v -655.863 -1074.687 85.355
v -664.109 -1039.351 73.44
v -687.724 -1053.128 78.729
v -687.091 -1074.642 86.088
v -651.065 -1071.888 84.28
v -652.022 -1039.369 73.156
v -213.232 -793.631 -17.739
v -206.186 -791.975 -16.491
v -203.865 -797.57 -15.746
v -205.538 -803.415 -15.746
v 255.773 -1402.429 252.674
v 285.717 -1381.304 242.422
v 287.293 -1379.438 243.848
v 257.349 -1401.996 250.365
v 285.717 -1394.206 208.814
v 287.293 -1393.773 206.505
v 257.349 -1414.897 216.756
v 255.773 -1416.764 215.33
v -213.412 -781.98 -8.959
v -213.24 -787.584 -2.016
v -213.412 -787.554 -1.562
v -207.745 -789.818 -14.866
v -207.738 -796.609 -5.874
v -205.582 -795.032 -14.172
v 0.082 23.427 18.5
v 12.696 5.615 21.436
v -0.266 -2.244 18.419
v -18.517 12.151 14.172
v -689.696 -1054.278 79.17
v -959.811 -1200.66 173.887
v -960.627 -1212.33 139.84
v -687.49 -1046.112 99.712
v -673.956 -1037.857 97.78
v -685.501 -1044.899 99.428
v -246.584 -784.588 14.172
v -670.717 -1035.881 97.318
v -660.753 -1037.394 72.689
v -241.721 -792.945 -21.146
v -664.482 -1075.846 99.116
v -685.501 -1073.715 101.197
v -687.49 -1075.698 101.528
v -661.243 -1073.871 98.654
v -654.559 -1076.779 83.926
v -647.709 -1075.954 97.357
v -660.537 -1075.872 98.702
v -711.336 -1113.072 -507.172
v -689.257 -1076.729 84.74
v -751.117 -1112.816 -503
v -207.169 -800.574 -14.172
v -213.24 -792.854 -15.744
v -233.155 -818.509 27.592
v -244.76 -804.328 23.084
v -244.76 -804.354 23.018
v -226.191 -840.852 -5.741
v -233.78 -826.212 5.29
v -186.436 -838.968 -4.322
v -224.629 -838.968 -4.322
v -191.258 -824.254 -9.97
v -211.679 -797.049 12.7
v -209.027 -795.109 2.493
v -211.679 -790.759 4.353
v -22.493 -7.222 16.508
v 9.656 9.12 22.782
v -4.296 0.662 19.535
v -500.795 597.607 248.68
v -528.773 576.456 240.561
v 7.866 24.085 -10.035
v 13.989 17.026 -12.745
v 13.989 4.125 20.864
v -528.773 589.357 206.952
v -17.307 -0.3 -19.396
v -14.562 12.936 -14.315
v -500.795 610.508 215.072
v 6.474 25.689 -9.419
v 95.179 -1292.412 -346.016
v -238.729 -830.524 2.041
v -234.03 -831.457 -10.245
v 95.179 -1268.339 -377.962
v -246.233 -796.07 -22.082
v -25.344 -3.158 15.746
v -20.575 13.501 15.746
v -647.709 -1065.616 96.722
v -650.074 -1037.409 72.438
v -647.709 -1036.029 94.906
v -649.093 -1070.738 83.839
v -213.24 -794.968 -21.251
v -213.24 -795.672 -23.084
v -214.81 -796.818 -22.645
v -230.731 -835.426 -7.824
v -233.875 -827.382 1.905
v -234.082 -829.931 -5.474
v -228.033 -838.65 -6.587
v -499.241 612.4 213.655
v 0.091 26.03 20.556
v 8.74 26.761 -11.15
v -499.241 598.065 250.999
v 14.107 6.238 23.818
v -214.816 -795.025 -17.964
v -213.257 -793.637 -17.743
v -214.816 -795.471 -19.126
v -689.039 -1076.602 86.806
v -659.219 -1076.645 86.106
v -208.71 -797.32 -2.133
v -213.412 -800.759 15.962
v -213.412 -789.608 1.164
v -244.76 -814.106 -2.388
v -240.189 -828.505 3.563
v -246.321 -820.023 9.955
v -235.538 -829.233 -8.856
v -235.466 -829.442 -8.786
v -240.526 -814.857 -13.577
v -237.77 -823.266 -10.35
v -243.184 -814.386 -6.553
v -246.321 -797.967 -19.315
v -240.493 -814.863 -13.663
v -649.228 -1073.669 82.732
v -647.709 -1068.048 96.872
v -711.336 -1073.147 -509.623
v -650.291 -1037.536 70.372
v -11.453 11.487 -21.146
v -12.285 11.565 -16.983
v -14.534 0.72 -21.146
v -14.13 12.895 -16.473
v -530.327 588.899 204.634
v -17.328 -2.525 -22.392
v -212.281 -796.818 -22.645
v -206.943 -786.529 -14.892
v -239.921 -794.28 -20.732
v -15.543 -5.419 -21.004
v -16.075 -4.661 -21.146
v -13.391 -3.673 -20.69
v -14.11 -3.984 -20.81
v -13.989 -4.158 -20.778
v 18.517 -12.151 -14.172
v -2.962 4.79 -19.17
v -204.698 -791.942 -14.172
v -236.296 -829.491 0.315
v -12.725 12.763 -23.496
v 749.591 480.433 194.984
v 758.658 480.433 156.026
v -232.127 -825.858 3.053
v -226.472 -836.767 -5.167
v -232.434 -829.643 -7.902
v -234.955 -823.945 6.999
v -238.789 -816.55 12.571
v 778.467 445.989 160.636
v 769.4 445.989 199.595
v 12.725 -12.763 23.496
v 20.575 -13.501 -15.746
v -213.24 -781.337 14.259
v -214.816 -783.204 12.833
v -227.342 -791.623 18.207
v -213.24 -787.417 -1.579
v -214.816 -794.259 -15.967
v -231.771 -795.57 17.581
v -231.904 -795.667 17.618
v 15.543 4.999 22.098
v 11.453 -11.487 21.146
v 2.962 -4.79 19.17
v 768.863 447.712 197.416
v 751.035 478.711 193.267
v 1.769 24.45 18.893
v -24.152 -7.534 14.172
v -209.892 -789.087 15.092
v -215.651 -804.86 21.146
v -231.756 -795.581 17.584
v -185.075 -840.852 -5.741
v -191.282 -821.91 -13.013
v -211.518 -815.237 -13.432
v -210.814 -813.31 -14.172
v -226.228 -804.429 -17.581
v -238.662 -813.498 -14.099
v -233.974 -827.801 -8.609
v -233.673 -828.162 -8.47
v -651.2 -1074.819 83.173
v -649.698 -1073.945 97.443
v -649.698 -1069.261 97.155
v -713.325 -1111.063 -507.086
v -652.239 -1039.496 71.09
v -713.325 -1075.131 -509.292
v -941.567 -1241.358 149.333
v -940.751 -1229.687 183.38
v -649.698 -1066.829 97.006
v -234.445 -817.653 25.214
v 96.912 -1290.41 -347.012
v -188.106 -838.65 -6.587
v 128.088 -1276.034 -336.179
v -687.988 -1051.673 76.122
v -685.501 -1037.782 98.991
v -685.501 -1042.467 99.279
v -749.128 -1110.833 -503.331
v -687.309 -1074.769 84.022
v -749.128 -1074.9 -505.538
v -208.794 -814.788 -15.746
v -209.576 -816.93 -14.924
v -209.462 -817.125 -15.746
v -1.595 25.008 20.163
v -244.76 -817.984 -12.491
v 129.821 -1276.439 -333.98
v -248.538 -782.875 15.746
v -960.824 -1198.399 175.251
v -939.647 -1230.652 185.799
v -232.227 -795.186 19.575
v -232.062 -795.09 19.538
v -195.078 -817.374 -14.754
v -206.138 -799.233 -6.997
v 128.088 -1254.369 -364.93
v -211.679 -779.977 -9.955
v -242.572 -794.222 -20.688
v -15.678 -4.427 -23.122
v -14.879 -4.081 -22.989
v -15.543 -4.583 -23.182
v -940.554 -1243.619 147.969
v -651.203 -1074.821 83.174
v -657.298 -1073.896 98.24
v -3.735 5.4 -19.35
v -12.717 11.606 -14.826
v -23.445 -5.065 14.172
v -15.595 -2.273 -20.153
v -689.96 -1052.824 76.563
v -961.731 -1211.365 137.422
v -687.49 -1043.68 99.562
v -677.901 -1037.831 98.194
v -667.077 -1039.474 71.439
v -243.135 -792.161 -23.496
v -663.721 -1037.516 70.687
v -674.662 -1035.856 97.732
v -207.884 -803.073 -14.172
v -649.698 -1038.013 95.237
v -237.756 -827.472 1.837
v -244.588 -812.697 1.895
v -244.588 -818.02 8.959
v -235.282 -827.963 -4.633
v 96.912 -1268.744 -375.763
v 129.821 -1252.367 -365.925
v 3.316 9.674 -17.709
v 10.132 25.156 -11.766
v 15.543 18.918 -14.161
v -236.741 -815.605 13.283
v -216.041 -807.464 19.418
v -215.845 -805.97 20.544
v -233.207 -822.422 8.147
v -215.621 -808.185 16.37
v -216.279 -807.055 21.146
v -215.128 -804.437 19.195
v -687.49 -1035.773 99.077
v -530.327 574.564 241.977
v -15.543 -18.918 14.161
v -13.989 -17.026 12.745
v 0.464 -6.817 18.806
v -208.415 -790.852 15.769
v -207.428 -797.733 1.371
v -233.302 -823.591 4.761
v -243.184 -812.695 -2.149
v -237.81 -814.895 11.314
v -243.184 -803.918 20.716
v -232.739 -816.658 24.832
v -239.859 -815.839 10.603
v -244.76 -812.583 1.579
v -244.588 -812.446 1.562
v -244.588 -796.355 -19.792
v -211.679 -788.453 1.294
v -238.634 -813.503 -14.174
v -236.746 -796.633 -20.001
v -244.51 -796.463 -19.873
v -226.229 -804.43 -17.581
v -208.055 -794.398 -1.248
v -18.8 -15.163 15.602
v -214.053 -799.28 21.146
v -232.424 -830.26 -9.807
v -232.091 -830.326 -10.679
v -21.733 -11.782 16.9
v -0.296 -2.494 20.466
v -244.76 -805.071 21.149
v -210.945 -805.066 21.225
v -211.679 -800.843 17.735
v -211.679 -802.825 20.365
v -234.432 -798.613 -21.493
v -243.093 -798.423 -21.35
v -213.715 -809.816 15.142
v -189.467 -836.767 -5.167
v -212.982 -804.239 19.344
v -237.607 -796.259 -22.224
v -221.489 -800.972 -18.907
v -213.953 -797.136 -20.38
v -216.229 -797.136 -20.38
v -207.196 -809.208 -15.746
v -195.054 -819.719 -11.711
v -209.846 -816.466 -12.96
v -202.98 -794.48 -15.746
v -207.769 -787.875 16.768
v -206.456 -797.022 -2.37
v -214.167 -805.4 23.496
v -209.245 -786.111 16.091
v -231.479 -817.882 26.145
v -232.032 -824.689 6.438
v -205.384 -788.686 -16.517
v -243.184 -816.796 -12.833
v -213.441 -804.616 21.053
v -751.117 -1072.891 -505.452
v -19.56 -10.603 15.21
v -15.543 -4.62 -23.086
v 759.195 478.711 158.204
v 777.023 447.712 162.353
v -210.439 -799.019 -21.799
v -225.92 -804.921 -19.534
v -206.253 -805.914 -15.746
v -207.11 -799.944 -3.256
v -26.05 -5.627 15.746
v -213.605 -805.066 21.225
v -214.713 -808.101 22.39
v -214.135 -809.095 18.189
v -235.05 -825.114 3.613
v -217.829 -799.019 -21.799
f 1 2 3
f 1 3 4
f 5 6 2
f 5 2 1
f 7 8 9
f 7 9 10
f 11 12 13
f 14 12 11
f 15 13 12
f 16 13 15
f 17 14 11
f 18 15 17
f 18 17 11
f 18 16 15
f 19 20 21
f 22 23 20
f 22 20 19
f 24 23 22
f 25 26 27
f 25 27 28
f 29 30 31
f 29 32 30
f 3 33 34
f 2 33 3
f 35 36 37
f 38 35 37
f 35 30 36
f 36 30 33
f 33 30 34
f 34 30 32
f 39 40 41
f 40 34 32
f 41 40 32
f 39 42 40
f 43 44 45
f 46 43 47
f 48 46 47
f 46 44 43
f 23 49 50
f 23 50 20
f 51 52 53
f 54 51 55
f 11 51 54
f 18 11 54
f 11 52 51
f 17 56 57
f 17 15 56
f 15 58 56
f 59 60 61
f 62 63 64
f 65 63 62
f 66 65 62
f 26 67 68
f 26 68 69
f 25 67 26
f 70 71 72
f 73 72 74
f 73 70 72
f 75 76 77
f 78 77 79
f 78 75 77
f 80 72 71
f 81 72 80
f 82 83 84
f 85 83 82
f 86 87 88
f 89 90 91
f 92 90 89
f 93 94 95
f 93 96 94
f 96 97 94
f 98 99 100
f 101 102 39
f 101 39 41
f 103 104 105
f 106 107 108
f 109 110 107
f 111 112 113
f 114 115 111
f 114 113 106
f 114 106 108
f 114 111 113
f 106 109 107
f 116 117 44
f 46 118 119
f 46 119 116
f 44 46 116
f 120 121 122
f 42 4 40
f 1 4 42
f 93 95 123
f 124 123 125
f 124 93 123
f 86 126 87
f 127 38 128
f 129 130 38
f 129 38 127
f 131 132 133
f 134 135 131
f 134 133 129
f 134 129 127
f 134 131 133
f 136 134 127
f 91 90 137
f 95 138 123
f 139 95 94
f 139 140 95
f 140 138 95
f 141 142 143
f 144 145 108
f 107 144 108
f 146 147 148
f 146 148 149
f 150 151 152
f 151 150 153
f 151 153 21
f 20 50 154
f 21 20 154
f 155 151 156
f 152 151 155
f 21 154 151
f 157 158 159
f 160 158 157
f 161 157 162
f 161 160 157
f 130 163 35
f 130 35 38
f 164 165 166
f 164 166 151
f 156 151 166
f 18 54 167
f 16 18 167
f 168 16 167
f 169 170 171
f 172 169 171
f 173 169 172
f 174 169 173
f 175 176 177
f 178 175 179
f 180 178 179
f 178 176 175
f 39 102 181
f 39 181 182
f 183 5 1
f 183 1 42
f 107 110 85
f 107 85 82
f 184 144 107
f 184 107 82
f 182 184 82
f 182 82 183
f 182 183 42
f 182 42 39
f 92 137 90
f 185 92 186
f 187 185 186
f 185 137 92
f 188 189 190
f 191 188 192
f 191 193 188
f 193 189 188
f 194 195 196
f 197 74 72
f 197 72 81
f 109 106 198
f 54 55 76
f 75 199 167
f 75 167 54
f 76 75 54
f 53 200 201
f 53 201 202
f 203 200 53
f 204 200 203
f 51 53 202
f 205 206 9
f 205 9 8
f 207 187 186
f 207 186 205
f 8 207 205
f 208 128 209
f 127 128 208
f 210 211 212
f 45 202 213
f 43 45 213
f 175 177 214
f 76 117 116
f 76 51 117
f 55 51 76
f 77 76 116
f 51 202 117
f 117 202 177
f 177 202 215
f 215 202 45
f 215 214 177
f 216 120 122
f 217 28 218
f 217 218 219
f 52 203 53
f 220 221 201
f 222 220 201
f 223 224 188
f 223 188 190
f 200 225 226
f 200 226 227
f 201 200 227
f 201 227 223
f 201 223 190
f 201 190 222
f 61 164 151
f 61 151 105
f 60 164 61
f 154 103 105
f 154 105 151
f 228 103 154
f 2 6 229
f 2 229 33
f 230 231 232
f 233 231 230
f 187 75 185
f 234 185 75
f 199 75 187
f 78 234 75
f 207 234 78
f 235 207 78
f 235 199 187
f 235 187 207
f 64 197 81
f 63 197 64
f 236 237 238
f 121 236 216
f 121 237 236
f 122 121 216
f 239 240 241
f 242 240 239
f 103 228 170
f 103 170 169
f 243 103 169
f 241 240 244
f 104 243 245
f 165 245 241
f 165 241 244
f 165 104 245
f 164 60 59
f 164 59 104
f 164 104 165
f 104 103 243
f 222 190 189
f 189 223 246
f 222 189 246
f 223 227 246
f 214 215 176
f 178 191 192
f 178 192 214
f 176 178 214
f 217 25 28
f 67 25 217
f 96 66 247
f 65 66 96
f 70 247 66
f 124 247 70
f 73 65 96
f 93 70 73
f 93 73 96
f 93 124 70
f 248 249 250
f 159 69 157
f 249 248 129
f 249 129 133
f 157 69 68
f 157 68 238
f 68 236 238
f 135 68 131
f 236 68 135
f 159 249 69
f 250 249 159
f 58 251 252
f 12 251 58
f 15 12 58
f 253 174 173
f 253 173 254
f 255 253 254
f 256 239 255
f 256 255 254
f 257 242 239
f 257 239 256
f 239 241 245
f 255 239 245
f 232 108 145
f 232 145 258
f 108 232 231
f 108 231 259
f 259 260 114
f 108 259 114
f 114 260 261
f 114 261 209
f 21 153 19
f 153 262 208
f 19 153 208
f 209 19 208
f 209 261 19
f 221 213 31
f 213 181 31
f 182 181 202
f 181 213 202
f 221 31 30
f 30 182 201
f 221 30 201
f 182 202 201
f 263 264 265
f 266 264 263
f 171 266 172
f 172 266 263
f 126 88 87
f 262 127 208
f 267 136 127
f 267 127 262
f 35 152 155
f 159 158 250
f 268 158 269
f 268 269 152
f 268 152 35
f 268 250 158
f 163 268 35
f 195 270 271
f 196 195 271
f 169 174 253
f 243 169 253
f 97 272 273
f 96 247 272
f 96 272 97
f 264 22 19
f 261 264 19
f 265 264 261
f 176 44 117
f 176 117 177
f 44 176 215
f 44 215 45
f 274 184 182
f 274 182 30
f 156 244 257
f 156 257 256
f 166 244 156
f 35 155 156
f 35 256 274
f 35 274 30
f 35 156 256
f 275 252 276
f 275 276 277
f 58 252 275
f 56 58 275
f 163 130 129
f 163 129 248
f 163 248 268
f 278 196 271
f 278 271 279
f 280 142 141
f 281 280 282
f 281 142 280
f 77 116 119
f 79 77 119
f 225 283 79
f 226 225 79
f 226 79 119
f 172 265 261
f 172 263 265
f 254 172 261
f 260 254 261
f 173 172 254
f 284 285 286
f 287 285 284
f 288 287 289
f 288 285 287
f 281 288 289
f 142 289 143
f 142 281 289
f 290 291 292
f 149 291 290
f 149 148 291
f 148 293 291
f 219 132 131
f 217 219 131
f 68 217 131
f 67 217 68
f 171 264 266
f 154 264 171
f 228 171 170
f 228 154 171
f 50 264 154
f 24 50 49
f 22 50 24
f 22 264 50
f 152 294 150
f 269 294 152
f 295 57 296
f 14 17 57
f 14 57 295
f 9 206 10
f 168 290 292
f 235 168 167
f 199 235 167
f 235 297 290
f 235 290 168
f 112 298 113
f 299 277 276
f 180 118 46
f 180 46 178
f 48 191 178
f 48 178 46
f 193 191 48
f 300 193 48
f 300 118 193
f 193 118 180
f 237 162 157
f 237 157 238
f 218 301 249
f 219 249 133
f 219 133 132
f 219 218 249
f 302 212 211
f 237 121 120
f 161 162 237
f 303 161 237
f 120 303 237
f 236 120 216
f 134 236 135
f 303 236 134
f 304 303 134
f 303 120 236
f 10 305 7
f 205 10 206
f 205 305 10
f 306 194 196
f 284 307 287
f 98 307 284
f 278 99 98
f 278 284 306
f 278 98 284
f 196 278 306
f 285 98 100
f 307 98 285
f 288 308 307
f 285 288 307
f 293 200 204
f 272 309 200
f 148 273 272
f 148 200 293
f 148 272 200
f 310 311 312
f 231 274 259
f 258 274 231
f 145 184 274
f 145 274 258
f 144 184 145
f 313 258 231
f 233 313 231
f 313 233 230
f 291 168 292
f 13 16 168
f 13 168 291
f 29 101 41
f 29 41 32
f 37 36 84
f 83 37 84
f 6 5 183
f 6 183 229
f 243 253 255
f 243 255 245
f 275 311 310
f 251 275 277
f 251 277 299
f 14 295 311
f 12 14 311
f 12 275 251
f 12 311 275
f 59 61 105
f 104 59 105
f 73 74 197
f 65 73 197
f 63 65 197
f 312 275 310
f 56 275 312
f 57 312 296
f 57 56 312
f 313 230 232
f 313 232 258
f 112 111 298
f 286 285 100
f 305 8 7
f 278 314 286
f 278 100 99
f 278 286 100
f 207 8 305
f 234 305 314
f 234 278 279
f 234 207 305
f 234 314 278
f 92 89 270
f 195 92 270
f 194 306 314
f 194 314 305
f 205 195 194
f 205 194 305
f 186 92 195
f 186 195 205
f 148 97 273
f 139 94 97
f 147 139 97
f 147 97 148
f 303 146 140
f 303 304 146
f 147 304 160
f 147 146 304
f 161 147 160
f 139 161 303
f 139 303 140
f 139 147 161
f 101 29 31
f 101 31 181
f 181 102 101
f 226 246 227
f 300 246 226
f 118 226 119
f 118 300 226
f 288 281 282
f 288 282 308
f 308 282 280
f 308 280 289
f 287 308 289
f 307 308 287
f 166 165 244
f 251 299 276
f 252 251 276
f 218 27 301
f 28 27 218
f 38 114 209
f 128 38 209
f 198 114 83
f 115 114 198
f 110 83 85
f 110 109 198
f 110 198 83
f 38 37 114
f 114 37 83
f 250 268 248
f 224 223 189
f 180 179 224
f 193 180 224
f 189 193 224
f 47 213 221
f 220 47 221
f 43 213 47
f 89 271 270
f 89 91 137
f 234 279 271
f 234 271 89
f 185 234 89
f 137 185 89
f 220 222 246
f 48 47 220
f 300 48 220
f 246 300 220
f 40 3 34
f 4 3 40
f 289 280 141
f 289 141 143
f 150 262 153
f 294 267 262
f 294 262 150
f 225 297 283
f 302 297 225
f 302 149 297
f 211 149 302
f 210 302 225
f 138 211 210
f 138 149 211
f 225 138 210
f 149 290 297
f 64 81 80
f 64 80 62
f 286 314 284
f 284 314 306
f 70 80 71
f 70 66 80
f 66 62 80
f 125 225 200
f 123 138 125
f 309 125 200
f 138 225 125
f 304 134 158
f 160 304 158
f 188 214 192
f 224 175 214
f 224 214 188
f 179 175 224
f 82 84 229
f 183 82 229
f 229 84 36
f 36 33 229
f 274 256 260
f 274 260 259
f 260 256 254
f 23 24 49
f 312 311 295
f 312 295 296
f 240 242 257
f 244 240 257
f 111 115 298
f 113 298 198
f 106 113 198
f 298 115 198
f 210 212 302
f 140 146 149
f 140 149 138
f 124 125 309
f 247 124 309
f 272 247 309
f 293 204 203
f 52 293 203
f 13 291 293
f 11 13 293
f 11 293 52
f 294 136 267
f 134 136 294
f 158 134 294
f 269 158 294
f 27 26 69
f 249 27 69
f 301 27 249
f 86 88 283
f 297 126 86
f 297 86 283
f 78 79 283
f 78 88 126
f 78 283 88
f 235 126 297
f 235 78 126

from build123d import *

# Parameters (mm, degrees)
F6_W    = 40
F6_H    = 40
F6_W_2  = 36
F6_H_2  = 36
F5_W    = 40
F5_H    = 40
F5_W_2  = 36
F5_H_2  = 36
F13_W   = 40
F13_H   = 40
F13_W_2 = 36
F13_H_2 = 36
F20_W   = 40
F20_H   = 40
F20_W_2 = 36
F20_H_2 = 36
F25_W   = 40
F25_H   = 40
F25_W_2 = 36
F25_H_2 = 36


with BuildPart() as f11:
    # F11: sweep along a path in F2, F7, F10
    with BuildLine(Plane(origin=(0, 0, 0), x_dir=(1, 0, 0), z_dir=(0, -0.3583679495, 0.9335804265))) as f11_path:
        Line((0, 0), (764.0288873983, 496.1661608987))
    with BuildLine(Plane.XY) as f11_path_2:
        Line((0, 0), (-229, -800))
    with BuildLine(Plane(origin=(0, -102.742069809, -267.6522425435), x_dir=(1, 0, 0), z_dir=(0, -0.3583679495, -0.9335804265))) as f11_path_3:
        Line((-950.6889298291, 1197.8256350602), (-229, 746.8643411978))
    # F6 (on line) → F11 (sweep)
    with BuildSketch(Plane(origin=(764.0288873983, 463.2110161053, 177.810049715), x_dir=(-0.4952299095, 0.8610830461, -0.1152533056), z_dir=(0.8386705679, 0.5084643426, 0.1951811742))):
        Rectangle(F6_W, F6_H)
        Rectangle(F6_W_2, F6_H_2, mode=Mode.SUBTRACT)
    sweep(path=f11_path.line + f11_path_2.line + f11_path_3.line, transition=Transition.RIGHT)

    # F14: sweep along a path in F2
    with BuildLine(Plane(origin=(0, 0, 0), x_dir=(1, 0, 0), z_dir=(0, -0.3583679495, 0.9335804265))) as f14_path:
        Line((0, 0), (-514.7840798788, 635.7053964718))
    # F5 (on line) → F14 (sweep)
    with BuildSketch(Plane(origin=(-514.7840798788, 593.4821151647, 227.8164394485), x_dir=(-0.7771459615, -0.5875211991, -0.2255282581), z_dir=(-0.629320391, 0.7255282581, 0.2785042047))):
        Rectangle(F5_W, F5_H)
        Rectangle(F5_W_2, F5_H_2, mode=Mode.SUBTRACT)
    sweep(path=f14_path.line)

    # F15: sweep along a path in F10
    with BuildLine(Plane(origin=(0, -102.742069809, -267.6522425435), x_dir=(1, 0, 0), z_dir=(0, -0.3583679495, -0.9335804265))) as f15_path:
        Line((-229, 746.8643411978), (271.5327794398, 1387.51708388))
    # F13 (on line) → F15 (sweep)
    with BuildSketch(Plane(origin=(776.072475672, -927.3510842252, 355.9767290852), x_dir=(0.7880107536, 0.5747695027, -0.2206333405), z_dir=(0.6156614753, -0.7356714154, 0.282397798))):
        with Locations((-640.2700647459, -286.6943596362)):
            Rectangle(F13_W, F13_H)
        with Locations((-640.2700647459, -286.6943596362)):
            Rectangle(F13_W_2, F13_H_2, mode=Mode.SUBTRACT)
    sweep(path=f15_path.line)

    # F21: sweep along a path in F18
    with BuildLine(Plane(origin=(0, -289.7450576732, 384.5046783753), x_dir=(1, 0, 0), z_dir=(0, 0.6018150232, -0.79863551))) as f21_path:
        Line((-229, 638.9084080378), (112.5, 1230.4037588226))
    # F20 (on line) → F21 (sweep)
    with BuildSketch(Plane(origin=(560.9054560261, -775.8877736222, -584.6733742383), x_dir=(0.8660254038, 0.399317755, 0.3009075116), z_dir=(0.5, -0.6916386401, -0.5211870984))):
        with Locations((-517.7740214856, 481.4520185216)):
            Rectangle(F20_W, F20_H)
        with Locations((-517.7740214856, 481.4520185216)):
            Rectangle(F20_W_2, F20_H_2, mode=Mode.SUBTRACT)
    sweep(path=f21_path.line)

    # F26: sweep along a path in F23
    with BuildLine(Plane(origin=(290.0513412295, -497.2032011274, 0), x_dir=(-0.8637666966, -0.5038919466, 0), z_dir=(-0.5038919466, 0.8637666966, 0))) as f26_path:
        Line((1108.6913477208, 98.2169269961), (1182.3538043363, -506.3116848044))
    # F25 (on line) → F26 (sweep)
    with BuildSketch(Plane(origin=(-67.4518628313, -39.3491096563, -640.8673626896), x_dir=(0.9945271851, -0.006402875, -0.1042817402), z_dir=(-0.1044781228, -0.0609489633, -0.992657819))):
        with Locations((-667.4273420568, 1059.8983464665)):
            Rectangle(F25_W, F25_H)
        with Locations((-667.4273420568, 1059.8983464665)):
            Rectangle(F25_W_2, F25_H_2, mode=Mode.SUBTRACT)
    sweep(path=f26_path.line)


solid = f11.part
